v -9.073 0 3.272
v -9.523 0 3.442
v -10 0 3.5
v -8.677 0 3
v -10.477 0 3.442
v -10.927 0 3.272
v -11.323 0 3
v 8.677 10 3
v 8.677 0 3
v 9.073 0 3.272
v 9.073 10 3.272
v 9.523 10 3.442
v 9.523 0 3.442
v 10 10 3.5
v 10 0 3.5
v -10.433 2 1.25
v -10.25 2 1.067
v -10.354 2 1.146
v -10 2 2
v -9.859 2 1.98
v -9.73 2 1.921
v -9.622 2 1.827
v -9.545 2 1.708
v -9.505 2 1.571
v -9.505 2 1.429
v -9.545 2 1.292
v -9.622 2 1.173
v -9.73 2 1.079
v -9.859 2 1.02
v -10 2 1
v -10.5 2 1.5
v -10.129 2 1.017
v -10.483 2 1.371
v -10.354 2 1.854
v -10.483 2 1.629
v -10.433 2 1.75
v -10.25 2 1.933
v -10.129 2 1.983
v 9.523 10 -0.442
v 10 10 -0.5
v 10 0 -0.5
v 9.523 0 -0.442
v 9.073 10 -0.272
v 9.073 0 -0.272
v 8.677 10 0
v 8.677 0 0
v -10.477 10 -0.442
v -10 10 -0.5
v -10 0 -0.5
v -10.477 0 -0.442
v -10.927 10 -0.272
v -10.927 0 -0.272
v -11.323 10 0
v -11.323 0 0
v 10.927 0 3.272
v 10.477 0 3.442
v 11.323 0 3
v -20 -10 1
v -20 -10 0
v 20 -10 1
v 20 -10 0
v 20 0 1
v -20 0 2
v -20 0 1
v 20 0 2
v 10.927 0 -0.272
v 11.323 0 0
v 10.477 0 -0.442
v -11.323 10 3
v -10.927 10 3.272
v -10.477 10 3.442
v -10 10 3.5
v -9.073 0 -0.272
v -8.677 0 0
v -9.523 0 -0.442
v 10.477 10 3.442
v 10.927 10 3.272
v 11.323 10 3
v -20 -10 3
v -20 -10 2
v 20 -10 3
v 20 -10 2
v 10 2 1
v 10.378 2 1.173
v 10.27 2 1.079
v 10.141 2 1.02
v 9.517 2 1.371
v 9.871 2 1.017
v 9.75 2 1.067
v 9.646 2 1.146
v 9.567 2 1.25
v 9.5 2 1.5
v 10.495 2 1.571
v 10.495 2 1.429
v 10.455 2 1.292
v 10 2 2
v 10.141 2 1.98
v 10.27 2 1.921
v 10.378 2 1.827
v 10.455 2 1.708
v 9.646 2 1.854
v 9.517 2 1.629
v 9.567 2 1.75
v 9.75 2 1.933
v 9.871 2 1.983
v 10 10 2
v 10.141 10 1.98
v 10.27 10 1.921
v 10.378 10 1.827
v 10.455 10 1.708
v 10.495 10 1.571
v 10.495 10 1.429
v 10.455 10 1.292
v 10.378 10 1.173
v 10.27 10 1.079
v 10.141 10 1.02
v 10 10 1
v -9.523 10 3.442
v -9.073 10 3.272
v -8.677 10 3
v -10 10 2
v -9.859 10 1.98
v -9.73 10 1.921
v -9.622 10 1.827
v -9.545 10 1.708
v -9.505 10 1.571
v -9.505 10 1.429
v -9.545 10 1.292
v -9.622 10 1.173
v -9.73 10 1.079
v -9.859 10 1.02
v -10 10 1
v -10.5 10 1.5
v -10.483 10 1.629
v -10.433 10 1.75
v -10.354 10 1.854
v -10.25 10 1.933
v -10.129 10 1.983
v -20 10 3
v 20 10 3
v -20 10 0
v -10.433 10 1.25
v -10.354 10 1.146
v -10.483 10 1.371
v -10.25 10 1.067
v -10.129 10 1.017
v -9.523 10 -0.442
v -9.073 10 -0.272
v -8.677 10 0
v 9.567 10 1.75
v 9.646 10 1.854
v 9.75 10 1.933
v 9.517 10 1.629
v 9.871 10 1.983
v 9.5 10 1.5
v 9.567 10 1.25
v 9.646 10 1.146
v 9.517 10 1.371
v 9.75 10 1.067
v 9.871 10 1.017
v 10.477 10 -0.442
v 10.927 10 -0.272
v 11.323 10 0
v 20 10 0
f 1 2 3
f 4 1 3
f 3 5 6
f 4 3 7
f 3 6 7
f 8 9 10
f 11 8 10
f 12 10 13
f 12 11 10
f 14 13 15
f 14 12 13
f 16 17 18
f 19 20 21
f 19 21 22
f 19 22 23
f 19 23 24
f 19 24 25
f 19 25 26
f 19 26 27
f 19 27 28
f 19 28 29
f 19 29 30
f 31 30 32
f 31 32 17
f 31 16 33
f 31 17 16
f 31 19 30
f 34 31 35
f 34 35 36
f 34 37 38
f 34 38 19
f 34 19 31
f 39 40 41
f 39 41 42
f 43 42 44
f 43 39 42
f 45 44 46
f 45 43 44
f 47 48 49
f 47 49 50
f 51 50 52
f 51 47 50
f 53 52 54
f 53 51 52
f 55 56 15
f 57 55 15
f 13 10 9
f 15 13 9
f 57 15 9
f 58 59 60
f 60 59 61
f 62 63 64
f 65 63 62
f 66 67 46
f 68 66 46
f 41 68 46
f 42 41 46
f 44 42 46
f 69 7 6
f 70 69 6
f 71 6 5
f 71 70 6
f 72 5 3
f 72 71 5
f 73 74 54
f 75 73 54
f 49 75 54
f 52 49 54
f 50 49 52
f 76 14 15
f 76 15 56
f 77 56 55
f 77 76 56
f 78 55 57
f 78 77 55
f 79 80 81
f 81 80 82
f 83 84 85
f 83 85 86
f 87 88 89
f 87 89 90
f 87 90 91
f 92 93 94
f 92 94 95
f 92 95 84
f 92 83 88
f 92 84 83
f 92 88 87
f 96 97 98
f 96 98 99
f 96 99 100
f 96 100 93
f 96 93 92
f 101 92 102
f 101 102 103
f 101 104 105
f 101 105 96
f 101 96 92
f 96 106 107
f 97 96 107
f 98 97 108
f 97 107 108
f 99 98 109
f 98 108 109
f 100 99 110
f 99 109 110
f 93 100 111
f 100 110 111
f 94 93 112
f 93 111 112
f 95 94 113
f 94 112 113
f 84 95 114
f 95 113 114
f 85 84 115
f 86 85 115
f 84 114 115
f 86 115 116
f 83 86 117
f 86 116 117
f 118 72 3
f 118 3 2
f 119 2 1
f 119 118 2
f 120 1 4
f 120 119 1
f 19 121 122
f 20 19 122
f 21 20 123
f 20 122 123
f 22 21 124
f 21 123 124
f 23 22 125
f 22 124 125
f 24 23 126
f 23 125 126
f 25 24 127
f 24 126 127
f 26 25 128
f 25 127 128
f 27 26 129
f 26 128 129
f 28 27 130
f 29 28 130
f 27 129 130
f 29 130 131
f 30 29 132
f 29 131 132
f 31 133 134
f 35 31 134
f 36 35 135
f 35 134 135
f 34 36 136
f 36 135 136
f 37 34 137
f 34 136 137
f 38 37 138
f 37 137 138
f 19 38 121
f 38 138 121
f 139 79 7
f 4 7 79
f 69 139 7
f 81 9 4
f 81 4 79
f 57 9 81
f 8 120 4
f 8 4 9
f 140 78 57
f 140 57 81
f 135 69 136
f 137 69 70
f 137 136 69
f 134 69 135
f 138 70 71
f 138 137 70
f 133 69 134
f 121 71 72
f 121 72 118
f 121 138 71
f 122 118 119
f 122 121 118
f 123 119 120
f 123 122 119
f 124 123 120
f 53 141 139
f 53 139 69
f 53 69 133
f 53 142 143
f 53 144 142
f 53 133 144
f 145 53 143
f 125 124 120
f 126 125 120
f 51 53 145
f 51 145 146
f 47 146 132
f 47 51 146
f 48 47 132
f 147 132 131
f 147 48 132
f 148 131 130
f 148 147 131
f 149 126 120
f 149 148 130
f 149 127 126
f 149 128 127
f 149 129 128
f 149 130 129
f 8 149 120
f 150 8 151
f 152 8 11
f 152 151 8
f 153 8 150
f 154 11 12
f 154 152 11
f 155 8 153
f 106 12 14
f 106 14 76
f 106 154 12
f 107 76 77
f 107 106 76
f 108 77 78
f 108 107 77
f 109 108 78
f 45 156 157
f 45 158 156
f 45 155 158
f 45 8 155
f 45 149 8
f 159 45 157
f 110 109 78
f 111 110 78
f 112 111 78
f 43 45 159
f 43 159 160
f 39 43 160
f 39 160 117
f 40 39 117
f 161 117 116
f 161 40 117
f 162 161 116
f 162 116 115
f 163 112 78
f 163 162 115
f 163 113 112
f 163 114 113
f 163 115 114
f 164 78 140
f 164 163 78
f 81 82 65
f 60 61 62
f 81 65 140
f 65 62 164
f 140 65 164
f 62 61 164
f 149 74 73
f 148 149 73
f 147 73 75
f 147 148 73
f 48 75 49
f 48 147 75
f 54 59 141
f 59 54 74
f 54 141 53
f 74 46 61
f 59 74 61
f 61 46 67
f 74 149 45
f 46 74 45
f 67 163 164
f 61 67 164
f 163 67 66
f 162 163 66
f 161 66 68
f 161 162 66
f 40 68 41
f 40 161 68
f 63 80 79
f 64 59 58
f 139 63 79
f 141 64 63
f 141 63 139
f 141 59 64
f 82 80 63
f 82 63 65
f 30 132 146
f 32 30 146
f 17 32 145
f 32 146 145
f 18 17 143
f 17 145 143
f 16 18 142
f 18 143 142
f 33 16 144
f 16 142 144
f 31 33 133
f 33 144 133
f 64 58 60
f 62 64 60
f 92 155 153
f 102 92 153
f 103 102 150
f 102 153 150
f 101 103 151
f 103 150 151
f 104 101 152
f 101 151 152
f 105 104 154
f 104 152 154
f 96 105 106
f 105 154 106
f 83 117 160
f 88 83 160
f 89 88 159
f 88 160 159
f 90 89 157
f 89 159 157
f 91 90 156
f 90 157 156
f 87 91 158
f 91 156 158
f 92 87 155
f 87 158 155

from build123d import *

# Parameters (mm, degrees)
F0_W     = 40
F0_H     = 20
F1_DEPTH = 3
F2_W     = 40
F2_H     = 1
F3_DEPTH = 10
F5_DEPTH = 10
F6_DEPTH = 8


with BuildPart() as f1:
    # F0 (on Top) → F1 (new body)
    with BuildSketch(Plane.XY):
        Rectangle(F0_W, F0_H)
    extrude(amount=F1_DEPTH)

    # F2 (on face) → F3 (cut)
    with BuildSketch(Plane.XZ.offset(10)):
        with Locations((0, 1.5)):
            Rectangle(F2_W, F2_H)
    extrude(amount=-F3_DEPTH, mode=Mode.SUBTRACT)

    # F4 (on face) → F5 (join)
    with BuildSketch(Plane(origin=(0, 10, 0), x_dir=(-1, 0, 0), z_dir=(0, 1, 0))):
        with BuildLine():
            ThreePointArc((10, 3.5), (9.2928932188, 3.3708286934), (8.6771243445, 3))
            Line((8.6771243445, 3), (10, 3))
            Line((10, 3), (10, 3.5))
        make_face()
        with BuildLine():
            Line((-10, 3), (-8.6771243445, 3))
            ThreePointArc((-8.6771243445, 3), (-9.2928932188, 3.3708286934), (-10, 3.5))
            Line((-10, 3.5), (-10, 3))
        make_face()
        with BuildLine():
            ThreePointArc((11.3228756555, 3), (10.7071067812, 3.3708286934), (10, 3.5))
            Line((10, 3.5), (10, 3))
            Line((10, 3), (11.3228756555, 3))
        make_face()
        with BuildLine():
            Line((-10, 3), (-10, 3.5))
            ThreePointArc((-10, 3.5), (-10.7071067812, 3.3708286934), (-11.3228756555, 3))
            Line((-11.3228756555, 3), (-10, 3))
        make_face()
        with BuildLine():
            ThreePointArc((-10, -0.5), (-9.2928932188, -0.3708286934), (-8.6771243445, 0))
            Line((-8.6771243445, 0), (-10, 0))
            Line((-10, 0), (-10, -0.5))
        make_face()
        with BuildLine():
            Line((10, 0), (8.6771243445, 0))
            ThreePointArc((8.6771243445, 0), (9.2928932188, -0.3708286934), (10, -0.5))
            Line((10, -0.5), (10, 0))
        make_face()
        with BuildLine():
            ThreePointArc((-11.3228756555, 0), (-10.7071067812, -0.3708286934), (-10, -0.5))
            Line((-10, -0.5), (-10, 0))
            Line((-10, 0), (-11.3228756555, 0))
        make_face()
        with BuildLine():
            Line((10, 0), (10, -0.5))
            ThreePointArc((10, -0.5), (10.7071067812, -0.3708286934), (11.3228756555, 0))
            Line((11.3228756555, 0), (10, 0))
        make_face()
    extrude(amount=-F5_DEPTH)

    # F4 (on face) → F6 (cut)
    with BuildSketch(Plane(origin=(0, 10, 0), x_dir=(-1, 0, 0), z_dir=(0, 1, 0))):
        with BuildLine():
            ThreePointArc((-10, 2), (-10.5, 1.5), (-10, 1))
            Line((-10, 1), (-10, 2))
        make_face()
        with BuildLine():
            Line((-10, 2), (-10, 1))
            ThreePointArc((-10, 1), (-9.6464466094, 1.1464466094), (-9.5, 1.5))
            ThreePointArc((-9.5, 1.5), (-9.6464466094, 1.8535533906), (-10, 2))
        make_face()
        with BuildLine():
            Line((10, 2), (10, 1))
            ThreePointArc((10, 1), (10.3535533906, 1.1464466094), (10.5, 1.5))
            ThreePointArc((10.5, 1.5), (10.3535533906, 1.8535533906), (10, 2))
        make_face()
        with BuildLine():
            ThreePointArc((10, 2), (9.5, 1.5), (10, 1))
            Line((10, 1), (10, 2))
        make_face()
    extrude(amount=-F6_DEPTH, mode=Mode.SUBTRACT)


solid = f1.part
